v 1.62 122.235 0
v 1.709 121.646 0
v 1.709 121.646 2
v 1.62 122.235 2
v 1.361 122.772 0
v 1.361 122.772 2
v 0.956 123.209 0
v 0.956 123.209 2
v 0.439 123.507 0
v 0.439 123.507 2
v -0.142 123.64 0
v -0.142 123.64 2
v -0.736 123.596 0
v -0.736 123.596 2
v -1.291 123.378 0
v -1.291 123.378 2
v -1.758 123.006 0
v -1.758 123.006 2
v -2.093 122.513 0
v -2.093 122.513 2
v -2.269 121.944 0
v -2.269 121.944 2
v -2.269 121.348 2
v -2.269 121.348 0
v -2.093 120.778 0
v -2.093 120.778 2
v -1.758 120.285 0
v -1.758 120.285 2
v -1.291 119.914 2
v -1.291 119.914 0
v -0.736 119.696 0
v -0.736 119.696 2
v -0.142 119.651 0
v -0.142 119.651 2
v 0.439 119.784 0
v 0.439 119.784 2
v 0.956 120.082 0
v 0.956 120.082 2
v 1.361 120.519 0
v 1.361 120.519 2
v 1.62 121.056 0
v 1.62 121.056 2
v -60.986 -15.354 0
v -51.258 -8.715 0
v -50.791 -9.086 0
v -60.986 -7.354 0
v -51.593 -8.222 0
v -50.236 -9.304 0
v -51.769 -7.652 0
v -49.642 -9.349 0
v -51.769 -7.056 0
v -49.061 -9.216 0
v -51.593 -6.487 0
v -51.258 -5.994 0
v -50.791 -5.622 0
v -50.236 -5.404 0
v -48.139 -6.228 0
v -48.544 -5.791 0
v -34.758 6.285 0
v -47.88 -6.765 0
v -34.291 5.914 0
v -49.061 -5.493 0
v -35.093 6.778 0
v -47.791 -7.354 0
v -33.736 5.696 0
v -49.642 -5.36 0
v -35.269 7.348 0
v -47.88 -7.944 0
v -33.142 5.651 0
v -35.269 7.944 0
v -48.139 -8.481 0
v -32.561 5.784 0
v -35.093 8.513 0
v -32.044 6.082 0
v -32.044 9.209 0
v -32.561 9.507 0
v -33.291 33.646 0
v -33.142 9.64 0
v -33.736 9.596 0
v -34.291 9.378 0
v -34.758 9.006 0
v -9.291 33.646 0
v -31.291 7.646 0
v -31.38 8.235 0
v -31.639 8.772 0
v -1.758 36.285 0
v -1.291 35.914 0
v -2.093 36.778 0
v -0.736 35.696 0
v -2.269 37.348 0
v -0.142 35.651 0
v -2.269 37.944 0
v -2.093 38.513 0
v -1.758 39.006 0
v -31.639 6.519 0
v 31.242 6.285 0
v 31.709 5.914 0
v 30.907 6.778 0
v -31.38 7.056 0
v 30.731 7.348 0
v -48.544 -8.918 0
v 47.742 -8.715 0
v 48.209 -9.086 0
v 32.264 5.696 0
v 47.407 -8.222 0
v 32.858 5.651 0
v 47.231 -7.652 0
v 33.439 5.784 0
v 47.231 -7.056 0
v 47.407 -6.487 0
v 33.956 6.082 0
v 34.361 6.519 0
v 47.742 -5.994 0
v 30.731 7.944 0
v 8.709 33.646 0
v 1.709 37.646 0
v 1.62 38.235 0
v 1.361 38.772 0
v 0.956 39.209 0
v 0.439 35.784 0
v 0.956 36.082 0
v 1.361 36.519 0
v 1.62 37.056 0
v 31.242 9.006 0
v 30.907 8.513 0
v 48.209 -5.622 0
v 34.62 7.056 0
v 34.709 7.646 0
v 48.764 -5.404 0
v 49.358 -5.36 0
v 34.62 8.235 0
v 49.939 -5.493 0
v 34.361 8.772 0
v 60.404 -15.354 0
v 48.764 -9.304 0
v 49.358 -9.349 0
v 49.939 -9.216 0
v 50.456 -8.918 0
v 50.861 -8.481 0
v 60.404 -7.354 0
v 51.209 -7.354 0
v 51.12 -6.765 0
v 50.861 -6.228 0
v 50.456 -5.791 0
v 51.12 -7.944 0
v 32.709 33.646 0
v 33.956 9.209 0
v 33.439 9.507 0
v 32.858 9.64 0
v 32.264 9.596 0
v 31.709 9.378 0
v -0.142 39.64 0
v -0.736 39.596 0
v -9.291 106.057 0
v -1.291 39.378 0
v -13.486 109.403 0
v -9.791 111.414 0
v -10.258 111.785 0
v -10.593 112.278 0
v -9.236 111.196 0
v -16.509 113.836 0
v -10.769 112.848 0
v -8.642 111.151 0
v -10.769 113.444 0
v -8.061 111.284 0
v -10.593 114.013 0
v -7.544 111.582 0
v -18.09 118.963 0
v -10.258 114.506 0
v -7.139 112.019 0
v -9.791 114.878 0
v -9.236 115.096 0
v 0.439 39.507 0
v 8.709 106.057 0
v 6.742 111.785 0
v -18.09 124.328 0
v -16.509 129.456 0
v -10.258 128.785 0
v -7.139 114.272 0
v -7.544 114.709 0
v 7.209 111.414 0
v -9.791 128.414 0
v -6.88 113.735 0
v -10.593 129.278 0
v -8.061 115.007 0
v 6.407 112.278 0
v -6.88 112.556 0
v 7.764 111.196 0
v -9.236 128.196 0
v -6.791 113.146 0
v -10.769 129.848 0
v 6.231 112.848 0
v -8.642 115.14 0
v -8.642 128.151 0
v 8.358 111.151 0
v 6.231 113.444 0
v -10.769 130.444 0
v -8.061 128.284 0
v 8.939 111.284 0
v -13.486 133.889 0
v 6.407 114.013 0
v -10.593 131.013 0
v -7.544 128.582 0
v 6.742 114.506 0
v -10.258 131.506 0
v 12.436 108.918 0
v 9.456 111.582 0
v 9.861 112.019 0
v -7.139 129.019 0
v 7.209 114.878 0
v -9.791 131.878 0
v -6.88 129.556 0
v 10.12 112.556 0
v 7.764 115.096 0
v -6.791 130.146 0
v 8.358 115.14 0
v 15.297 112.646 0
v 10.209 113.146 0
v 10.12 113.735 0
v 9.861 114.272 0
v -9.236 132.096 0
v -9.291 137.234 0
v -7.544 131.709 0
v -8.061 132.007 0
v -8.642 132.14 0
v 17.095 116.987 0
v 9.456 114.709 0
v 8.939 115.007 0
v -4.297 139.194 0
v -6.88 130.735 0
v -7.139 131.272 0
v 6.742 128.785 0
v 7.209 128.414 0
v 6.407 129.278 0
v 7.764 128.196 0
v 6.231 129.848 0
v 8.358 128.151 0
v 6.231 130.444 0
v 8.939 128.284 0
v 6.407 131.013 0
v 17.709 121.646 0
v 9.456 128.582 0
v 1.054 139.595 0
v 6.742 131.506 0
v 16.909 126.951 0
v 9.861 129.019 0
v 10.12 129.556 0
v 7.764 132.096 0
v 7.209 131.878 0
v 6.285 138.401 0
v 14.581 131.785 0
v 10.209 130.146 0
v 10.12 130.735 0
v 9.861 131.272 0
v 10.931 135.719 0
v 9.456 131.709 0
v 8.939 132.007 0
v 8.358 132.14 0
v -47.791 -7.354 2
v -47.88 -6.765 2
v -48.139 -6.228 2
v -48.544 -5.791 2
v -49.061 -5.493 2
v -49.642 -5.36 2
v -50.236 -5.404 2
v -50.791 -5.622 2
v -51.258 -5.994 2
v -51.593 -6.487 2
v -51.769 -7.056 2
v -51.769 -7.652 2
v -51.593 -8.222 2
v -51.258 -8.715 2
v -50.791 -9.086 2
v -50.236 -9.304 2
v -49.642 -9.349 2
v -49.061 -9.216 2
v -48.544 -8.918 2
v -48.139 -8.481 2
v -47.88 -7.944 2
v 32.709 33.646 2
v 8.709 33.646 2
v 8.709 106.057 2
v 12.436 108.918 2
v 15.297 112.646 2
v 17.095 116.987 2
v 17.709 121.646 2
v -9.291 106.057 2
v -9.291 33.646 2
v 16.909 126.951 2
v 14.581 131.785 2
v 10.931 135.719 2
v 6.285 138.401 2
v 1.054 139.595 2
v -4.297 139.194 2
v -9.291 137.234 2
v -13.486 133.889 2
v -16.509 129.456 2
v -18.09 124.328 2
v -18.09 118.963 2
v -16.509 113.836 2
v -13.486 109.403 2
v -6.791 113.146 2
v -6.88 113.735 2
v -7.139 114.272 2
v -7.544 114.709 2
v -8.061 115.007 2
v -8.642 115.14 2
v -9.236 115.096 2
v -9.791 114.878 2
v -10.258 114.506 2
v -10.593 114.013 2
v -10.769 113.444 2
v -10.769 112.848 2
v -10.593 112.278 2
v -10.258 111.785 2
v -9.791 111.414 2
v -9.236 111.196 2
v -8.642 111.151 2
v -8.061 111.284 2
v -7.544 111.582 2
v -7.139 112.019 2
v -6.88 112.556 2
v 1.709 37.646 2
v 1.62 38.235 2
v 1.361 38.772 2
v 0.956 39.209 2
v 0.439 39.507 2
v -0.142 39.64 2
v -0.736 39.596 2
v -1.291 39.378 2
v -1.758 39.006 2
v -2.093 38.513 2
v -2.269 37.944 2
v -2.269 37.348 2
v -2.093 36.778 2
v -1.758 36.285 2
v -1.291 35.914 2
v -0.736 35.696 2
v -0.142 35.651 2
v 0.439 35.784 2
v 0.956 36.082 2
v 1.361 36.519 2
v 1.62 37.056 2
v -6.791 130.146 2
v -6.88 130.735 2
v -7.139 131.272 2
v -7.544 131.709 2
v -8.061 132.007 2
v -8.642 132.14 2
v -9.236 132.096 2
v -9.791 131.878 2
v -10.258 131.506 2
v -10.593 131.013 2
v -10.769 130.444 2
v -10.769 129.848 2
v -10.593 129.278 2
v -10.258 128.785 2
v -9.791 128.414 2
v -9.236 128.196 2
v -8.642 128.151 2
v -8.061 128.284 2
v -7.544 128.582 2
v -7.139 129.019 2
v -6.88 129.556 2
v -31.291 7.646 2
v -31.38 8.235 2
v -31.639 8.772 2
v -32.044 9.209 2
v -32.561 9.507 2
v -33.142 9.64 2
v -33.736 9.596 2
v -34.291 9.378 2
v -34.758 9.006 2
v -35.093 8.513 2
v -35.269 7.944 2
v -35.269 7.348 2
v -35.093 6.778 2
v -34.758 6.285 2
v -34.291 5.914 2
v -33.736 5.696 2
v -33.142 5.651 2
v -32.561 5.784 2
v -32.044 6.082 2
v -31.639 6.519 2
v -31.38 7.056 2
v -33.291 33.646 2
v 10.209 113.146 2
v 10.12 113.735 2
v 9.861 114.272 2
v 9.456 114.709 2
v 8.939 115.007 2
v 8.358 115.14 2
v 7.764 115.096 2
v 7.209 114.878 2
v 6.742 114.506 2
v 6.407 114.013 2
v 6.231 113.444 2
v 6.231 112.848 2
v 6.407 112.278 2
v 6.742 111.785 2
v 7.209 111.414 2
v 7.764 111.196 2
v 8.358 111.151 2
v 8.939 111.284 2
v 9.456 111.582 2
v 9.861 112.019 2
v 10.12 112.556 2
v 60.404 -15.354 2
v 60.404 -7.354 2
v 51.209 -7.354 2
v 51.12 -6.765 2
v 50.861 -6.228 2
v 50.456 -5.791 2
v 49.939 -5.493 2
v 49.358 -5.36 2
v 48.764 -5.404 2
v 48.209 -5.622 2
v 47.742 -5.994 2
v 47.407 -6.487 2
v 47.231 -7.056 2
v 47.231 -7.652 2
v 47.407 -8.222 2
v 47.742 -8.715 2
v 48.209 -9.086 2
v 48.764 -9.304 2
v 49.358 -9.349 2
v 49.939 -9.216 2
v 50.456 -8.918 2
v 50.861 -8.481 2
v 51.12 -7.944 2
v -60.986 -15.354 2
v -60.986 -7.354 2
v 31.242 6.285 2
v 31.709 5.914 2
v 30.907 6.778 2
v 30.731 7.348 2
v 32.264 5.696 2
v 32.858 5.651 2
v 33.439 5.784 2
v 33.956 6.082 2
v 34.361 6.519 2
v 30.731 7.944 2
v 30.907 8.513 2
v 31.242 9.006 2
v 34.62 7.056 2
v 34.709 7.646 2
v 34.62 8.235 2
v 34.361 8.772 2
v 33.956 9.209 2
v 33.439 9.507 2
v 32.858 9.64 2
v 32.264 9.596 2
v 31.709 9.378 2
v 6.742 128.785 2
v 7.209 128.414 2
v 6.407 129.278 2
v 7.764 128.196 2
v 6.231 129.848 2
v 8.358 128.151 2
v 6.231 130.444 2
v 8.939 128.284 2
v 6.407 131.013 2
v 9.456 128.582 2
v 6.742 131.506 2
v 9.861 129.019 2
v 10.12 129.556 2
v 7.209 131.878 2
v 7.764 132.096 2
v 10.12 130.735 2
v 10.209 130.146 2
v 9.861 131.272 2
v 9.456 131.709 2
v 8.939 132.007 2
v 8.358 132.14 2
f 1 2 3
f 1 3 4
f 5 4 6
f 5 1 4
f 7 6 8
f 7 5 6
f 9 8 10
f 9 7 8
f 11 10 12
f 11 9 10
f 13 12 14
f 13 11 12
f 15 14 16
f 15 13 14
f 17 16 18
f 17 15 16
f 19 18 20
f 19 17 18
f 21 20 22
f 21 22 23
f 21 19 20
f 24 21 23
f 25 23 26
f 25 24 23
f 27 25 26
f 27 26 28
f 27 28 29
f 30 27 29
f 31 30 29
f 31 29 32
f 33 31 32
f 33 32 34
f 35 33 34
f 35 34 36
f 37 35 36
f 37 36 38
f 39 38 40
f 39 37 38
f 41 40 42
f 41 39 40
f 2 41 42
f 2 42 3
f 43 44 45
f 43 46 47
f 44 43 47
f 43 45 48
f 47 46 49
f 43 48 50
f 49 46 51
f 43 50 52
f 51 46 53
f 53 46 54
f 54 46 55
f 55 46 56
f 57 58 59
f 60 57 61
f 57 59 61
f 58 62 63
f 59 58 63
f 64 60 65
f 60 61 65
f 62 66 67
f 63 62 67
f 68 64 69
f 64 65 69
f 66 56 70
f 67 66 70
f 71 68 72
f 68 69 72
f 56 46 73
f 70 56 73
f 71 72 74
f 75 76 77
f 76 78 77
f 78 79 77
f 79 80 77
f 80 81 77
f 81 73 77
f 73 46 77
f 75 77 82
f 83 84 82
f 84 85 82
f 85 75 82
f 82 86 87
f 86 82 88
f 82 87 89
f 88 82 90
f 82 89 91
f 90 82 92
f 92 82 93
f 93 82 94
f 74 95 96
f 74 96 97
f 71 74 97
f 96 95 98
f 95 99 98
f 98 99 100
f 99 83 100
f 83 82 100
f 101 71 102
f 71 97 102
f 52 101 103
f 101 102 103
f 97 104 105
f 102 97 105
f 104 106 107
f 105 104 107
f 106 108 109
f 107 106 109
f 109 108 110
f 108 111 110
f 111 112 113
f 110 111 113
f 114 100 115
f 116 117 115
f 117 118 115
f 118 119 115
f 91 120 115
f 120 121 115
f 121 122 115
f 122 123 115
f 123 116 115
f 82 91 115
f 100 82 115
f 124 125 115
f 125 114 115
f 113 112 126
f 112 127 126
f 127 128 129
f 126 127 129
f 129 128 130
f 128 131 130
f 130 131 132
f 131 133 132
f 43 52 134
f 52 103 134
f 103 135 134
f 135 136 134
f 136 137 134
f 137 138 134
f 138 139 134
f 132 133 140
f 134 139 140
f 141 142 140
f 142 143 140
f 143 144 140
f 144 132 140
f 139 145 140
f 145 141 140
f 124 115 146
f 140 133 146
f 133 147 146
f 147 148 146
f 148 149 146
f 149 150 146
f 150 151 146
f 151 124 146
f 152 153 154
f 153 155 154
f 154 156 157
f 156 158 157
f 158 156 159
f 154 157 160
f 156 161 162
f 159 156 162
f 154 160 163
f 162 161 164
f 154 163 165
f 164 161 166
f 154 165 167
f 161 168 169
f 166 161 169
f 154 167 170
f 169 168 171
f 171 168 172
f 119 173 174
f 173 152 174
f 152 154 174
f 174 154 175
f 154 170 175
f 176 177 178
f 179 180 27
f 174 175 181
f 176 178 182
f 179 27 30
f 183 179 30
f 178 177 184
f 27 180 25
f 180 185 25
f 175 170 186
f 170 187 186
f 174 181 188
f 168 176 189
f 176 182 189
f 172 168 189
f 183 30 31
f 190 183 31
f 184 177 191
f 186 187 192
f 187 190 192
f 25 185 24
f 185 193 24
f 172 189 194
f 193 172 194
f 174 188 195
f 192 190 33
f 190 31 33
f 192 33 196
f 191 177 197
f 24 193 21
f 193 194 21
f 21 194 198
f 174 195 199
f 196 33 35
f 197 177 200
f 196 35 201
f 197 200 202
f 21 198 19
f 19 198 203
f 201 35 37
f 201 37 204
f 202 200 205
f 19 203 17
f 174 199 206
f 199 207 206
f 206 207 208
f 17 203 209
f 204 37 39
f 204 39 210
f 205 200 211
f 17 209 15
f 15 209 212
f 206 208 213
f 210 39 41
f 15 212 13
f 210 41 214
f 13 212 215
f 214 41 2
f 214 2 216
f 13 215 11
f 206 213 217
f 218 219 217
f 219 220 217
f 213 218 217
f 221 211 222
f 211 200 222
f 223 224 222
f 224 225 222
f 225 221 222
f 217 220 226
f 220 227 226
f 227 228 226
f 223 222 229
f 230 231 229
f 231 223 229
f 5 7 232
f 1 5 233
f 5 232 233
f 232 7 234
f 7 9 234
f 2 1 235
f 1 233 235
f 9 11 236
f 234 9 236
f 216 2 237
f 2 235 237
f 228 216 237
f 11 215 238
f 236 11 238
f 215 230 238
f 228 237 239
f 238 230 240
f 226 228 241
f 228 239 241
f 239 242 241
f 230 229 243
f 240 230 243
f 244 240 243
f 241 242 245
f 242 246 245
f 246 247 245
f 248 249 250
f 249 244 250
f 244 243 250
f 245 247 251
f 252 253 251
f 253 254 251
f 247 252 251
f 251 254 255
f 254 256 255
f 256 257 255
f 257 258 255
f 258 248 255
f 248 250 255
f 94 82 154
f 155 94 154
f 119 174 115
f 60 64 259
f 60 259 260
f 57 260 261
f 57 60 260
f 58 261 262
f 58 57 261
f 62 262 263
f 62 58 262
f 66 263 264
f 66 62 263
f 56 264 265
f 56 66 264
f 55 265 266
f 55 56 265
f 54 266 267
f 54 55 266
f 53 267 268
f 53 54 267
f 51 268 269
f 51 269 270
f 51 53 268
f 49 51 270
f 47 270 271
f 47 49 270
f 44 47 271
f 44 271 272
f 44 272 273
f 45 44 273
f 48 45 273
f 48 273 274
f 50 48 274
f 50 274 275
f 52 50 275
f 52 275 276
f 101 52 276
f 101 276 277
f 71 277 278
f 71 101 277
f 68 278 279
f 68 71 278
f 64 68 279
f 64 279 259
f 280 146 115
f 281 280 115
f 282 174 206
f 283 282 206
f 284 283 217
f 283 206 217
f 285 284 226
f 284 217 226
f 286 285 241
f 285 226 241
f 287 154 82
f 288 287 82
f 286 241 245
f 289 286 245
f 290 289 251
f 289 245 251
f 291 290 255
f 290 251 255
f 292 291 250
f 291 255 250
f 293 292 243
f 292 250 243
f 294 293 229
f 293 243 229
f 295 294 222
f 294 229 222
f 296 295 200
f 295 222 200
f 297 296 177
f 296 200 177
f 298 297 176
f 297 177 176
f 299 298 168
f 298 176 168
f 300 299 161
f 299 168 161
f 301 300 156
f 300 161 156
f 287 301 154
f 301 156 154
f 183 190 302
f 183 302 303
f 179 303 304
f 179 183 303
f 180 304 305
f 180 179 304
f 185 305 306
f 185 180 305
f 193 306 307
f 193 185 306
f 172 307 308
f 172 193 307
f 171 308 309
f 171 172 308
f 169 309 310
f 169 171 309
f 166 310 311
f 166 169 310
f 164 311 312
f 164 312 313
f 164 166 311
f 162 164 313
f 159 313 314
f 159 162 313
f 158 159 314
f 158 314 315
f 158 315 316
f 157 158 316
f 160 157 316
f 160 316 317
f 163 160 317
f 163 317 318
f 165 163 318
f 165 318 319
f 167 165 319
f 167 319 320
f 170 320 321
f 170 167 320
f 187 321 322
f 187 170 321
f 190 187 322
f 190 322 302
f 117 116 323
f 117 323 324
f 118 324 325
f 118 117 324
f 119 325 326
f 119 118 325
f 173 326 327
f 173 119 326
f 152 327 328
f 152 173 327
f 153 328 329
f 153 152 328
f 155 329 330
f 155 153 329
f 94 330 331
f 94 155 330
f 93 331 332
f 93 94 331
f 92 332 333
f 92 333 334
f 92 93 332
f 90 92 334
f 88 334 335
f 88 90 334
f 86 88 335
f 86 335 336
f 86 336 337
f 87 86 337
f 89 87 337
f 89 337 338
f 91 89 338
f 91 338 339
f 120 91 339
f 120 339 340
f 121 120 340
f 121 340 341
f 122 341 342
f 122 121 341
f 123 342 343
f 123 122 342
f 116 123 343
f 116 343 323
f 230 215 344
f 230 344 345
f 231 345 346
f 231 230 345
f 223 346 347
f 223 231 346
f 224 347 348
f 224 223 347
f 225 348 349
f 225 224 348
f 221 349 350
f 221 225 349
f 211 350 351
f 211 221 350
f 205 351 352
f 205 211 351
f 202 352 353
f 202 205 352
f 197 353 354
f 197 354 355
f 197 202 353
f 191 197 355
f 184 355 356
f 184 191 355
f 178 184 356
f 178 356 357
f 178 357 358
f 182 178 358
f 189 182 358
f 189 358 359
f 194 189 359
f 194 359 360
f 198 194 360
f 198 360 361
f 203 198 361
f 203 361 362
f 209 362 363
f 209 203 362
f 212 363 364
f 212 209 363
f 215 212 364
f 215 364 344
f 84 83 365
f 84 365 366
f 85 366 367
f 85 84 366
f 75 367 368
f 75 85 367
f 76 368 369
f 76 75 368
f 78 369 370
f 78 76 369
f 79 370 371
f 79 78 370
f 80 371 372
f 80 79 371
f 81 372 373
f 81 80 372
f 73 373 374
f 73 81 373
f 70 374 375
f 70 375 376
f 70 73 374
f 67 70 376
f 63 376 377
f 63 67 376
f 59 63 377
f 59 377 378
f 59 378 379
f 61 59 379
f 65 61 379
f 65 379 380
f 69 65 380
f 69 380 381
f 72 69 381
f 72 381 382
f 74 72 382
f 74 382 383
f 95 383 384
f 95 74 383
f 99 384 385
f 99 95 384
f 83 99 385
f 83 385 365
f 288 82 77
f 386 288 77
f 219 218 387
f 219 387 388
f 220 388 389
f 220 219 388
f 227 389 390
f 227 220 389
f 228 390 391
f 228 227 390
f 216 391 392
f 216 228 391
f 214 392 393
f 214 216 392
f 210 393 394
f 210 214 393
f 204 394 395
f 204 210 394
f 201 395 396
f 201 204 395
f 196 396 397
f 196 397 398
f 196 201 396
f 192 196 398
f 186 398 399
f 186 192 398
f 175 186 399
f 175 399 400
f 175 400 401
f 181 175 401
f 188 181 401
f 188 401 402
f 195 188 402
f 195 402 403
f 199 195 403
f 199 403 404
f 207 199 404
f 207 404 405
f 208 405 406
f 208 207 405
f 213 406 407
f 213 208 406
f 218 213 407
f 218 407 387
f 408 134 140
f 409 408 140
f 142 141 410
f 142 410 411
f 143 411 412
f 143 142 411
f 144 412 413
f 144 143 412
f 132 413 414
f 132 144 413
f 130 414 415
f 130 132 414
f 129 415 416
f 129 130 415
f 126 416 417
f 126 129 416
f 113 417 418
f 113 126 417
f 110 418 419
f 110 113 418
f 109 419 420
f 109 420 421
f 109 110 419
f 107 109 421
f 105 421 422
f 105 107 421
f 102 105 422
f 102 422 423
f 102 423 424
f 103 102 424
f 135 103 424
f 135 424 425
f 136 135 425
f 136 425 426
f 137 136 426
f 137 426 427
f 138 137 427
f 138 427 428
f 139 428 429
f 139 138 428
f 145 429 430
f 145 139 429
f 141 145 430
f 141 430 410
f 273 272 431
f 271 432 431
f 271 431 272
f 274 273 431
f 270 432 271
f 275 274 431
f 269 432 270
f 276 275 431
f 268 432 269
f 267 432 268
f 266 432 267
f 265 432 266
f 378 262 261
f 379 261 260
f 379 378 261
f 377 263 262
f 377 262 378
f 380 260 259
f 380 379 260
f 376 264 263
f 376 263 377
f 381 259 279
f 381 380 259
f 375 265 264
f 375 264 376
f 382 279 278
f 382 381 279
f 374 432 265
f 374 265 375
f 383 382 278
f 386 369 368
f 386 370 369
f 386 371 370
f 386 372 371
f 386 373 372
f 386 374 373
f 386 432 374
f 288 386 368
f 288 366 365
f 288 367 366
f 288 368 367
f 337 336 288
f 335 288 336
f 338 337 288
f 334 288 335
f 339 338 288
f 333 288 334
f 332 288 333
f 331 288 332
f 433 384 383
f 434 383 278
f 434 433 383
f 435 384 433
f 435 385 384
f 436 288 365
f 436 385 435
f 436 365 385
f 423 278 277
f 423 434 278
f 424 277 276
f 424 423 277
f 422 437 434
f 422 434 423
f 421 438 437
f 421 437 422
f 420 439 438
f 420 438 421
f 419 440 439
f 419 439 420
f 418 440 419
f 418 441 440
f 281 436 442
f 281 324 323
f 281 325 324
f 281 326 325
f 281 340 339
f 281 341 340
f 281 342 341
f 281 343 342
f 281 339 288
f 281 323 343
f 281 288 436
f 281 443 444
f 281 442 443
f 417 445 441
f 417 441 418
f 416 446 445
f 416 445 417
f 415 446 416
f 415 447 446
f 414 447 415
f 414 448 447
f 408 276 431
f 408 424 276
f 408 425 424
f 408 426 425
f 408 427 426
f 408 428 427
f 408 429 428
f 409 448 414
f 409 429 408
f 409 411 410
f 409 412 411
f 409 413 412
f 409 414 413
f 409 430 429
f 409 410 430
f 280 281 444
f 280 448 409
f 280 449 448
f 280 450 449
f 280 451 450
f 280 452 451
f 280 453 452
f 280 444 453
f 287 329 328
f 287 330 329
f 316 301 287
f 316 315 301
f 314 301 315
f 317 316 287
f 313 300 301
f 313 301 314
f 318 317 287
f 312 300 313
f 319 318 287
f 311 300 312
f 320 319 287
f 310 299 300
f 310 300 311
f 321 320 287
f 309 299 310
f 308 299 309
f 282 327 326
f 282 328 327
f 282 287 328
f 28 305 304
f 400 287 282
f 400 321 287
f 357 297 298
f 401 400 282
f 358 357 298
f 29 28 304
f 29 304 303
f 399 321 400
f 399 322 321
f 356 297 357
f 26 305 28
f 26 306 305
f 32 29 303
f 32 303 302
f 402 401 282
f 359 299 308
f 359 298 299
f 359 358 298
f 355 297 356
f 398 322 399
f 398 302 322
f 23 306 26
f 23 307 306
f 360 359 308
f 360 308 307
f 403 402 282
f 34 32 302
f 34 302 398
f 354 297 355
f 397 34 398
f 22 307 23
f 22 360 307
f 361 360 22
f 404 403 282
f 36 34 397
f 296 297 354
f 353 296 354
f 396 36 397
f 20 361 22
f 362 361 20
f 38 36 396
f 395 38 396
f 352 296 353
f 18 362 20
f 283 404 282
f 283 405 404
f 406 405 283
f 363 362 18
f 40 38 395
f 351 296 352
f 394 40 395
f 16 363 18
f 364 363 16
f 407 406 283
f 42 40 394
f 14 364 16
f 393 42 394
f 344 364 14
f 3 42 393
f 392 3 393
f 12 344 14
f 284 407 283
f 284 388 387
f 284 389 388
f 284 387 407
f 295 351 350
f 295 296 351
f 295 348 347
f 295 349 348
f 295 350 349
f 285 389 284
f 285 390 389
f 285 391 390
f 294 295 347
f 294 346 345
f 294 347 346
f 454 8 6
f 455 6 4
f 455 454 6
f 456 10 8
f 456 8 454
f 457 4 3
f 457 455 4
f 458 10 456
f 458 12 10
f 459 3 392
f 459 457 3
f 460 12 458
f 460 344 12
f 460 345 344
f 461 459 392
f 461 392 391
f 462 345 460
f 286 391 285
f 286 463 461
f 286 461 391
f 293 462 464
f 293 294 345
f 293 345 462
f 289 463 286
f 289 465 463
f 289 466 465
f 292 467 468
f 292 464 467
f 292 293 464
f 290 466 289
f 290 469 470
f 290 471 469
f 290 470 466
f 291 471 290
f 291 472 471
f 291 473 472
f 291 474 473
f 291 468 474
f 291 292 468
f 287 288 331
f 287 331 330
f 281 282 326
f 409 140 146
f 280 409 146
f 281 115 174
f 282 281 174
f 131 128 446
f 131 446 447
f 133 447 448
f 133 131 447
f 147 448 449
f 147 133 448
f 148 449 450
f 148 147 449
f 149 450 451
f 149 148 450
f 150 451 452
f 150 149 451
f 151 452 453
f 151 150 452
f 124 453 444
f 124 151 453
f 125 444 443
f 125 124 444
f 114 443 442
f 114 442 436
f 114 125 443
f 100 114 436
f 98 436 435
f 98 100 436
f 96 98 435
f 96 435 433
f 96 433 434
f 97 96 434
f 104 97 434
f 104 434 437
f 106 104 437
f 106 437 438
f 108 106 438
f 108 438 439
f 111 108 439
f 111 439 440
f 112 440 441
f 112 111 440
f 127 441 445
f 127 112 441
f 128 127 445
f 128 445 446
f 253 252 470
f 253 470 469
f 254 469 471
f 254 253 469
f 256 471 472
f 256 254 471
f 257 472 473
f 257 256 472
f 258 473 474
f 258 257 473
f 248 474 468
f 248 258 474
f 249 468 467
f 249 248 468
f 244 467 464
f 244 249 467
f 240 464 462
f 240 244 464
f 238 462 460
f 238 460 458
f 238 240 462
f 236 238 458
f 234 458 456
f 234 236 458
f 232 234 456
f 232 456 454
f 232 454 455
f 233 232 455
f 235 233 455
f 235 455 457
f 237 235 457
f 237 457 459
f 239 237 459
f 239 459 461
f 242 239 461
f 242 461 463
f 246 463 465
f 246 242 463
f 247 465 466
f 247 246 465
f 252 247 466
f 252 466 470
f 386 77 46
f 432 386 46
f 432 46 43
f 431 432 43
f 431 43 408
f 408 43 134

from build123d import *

# Parameters (mm, degrees)
SKETCH_1_R      = 2
EXTRUDE_1_DEPTH = 2


with BuildPart() as part:
    # 草图1 → 凸台-拉伸1 (new body)
    # profile 1 of 8: a face of its own
    with BuildSketch(Plane.XY):
        with BuildLine():
            Line((-9.291428571, 106.057257018), (-9.291428571, 33.645714286))
            Line((-9.291428571, 33.645714286), (-33.291428571, 33.645714286))
            Line((-33.291428571, 33.645714286), (-60.986481548, -7.354285714))
            Line((-60.986481548, -7.354285714), (-60.986481548, -15.354285714))
            Line((-60.986481548, -15.354285714), (-0.582857143, -15.354285714))
            Line((-0.582857143, -15.354285714), (0, -15.354285714))
            Line((0, -15.354285714), (60.403624405, -15.354285714))
            Line((60.403624405, -15.354285714), (60.403624405, -7.354285714))
            Line((60.403624405, -7.354285714), (32.708571429, 33.645714286))
            Line((32.708571429, 33.645714286), (8.708571429, 33.645714286))
            Line((8.708571429, 33.645714286), (8.708571429, 106.057257018))
            ThreePointArc((8.708571429, 106.057257018), (-0.291428571, 103.645714286), (-9.291428571, 106.057257018))
        make_face()
        with Locations((-49.791428571, -7.354285714)):
            Circle(SKETCH_1_R, mode=Mode.SUBTRACT)
        with Locations((-33.291428571, 7.645714286)):
            Circle(SKETCH_1_R, mode=Mode.SUBTRACT)
        with Locations((-16.791428571, -7.354285714)):
            Circle(SKETCH_1_R, mode=Mode.SUBTRACT)
        with Locations((-0.291428571, 7.645714286)):
            Circle(SKETCH_1_R, mode=Mode.SUBTRACT)
        with BuildLine():
            add(Edge.make_bspline(
                [(-13.112946754, 19.24107863), (-13.117507431, 19.192525358), (-13.126009121, 19.102015814), (-13.163633477, 18.976976473), (-13.224294442, 18.873128684), (-13.310152608, 18.796036169), (-13.405968226, 18.73894597), (-13.507221815, 18.696340834), (-13.614166311, 18.670943234), (-13.687426318, 18.668450292), (-13.724573402, 18.667186225)],
                knots=[0, 0, 0, 0, 1.240550697, 2.312546057, 3.302349966, 4.263860416, 5.218032513, 6.135468179, 7.054573937, 8, 8, 8, 8], degree=3))
            Line((-13.112946754, 19.24107863), (-13.11482685, 26.812195725))
            add(Edge.make_bspline(
                [(-13.789369633, 27.474632748), (-13.738803864, 27.471517031), (-13.642654112, 27.465592559), (-13.506191943, 27.437213361), (-13.389904602, 27.383659695), (-13.29104534, 27.311053803), (-13.217784011, 27.212861918), (-13.159811251, 27.09812106), (-13.124337859, 26.961571237), (-13.118115484, 26.863845486), (-13.11482685, 26.812195725)],
                knots=[0, 0, 0, 0, 1.133480904, 2.155290252, 3.097618657, 3.979323727, 4.869594101, 5.811399427, 6.843286507, 8, 8, 8, 8], degree=3))
            Line((-13.789369633, 27.474632748), (-14.40075185, 27.474632748))
            Line((-14.40075185, 27.474632748), (-14.40075185, 27.820910405))
            Line((-14.40075185, 27.820910405), (-10.408606041, 27.819030309))
            add(Edge.make_bspline(
                [(-6.505475334, 25.491078195), (-6.511083553, 25.602982802), (-6.521868874, 25.818189643), (-6.578610538, 26.127030514), (-6.668917007, 26.406444081), (-6.789027977, 26.66029892), (-6.947901882, 26.881604625), (-7.136344835, 27.07724673), (-7.359552705, 27.2419029), (-7.614270146, 27.375992441), (-7.893693166, 27.487106242), (-8.19396601, 27.582695288), (-8.513763866, 27.663670597), (-8.853977795, 27.72677366), (-9.213774122, 27.775986746), (-9.594447471, 27.807289222), (-9.995086667, 27.822188477), (-10.268706481, 27.820098763), (-10.408606041, 27.819030309)],
                knots=[0, 0, 0, 0, 1.039956407, 1.999968905, 2.906576639, 3.761369915, 4.597245318, 5.425510473, 6.27508438, 7.161467835, 8.092027264, 9.06500281, 10.086778256, 11.154172993, 12.277381244, 13.458582467, 14.700594122, 16, 16, 16, 16], degree=3))
            add(Edge.make_bspline(
                [(-7.410685493, 23.599734723), (-7.337701139, 23.66023899), (-7.194252283, 23.779158558), (-7.007785968, 23.981932383), (-6.849592603, 24.198320221), (-6.720772992, 24.428804957), (-6.622143236, 24.674348151), (-6.55291019, 24.934021594), (-6.509921831, 25.207967941), (-6.506975444, 25.395565592), (-6.505475334, 25.491078195)],
                knots=[0, 0, 0, 0, 1.043790947, 2.051544049, 3.026393326, 3.991957292, 4.953478889, 5.934510146, 6.948386013, 8, 8, 8, 8], degree=3))
            add(Edge.make_bspline(
                [(-9.79483465, 22.920112189), (-9.668072083, 22.930874387), (-9.42133434, 22.95182253), (-9.063387198, 23.002941381), (-8.729069898, 23.067878882), (-8.419068097, 23.147758169), (-8.13153105, 23.236737689), (-7.867617151, 23.341850523), (-7.627526667, 23.46143573), (-7.481477348, 23.554584431), (-7.410685493, 23.599734723)],
                knots=[0, 0, 0, 0, 1.218224179, 2.371219609, 3.461127923, 4.47824446, 5.435918827, 6.34183842, 7.196269206, 8, 8, 8, 8], degree=3))
            Line((-9.79483465, 22.920112189), (-7.530338991, 19.201039754))
            Line((-7.530338991, 19.201039754), (-7.184853437, 18.813977062))
            add(Edge.make_bspline(
                [(-6.722360853, 18.667188063), (-6.768845187, 18.668665711), (-6.857277038, 18.671476791), (-6.981761265, 18.701583574), (-7.093732838, 18.744203903), (-7.155001921, 18.791119063), (-7.184853437, 18.813977062)],
                knots=[0, 0, 0, 0, 1.124128933, 2.138544239, 3.093061746, 4, 4, 4, 4], degree=3))
            Line((-6.722360853, 18.667188063), (-6.113351269, 18.667188063))
            Line((-6.113351269, 18.667188063), (-6.113351269, 18.320910405))
            Line((-6.113351269, 18.320910405), (-7.810070808, 18.320910405))
            Line((-7.810070808, 18.320910405), (-10.527465599, 22.897771577))
            Line((-10.527465599, 22.897771577), (-12.52578157, 22.897771577))
            Line((-12.52578157, 22.897771577), (-12.52578157, 19.239294101))
            add(Edge.make_bspline(
                [(-11.792919055, 18.667188063), (-11.823350778, 18.666209041), (-11.888091701, 18.664126256), (-11.991662462, 18.682264711), (-12.107597956, 18.710327015), (-12.231876724, 18.750220148), (-12.354616091, 18.81411357), (-12.446003333, 18.926100007), (-12.507736237, 19.070653451), (-12.519462841, 19.180243125), (-12.52578157, 19.239294101)],
                knots=[0, 0, 0, 0, 0.693802496, 1.476006268, 2.390026098, 3.418615026, 4.45832201, 5.494963609, 6.650193591, 8, 8, 8, 8], degree=3))
            Line((-11.792919055, 18.667188063), (-11.193493734, 18.667188063))
            Line((-11.193493734, 18.667188063), (-11.193493734, 18.320910405))
            Line((-11.193493734, 18.320910405), (-14.40075185, 18.320910405))
            Line((-14.40075185, 18.320910405), (-14.40075185, 18.667188063))
            Line((-14.40075185, 18.667188063), (-13.724573402, 18.667186225))
        make_face(mode=Mode.SUBTRACT)
        with BuildLine():
            add(Edge.make_bspline(
                [(-3.959220736, 19.256284802), (-3.963076567, 19.209692223), (-3.970336414, 19.121966646), (-3.99829712, 18.999267855), (-4.040647434, 18.894845847), (-4.098141365, 18.809276619), (-4.169771264, 18.742396089), (-4.256941445, 18.697064656), (-4.357818409, 18.669880708), (-4.429516429, 18.668116788), (-4.467341025, 18.667186225)],
                knots=[0, 0, 0, 0, 1.271999278, 2.394949411, 3.413369715, 4.323118431, 5.181536852, 6.052778271, 6.972734865, 8, 8, 8, 8], degree=3))
            Line((-3.959220736, 19.256284802), (-3.961100832, 26.802786056))
            add(Edge.make_bspline(
                [(-4.49255416, 27.474632748), (-4.446878408, 27.471341575), (-4.360538549, 27.465120344), (-4.242120001, 27.430079243), (-4.143492644, 27.372060649), (-4.071985769, 27.287646224), (-4.01839387, 27.187251308), (-3.984206611, 27.071268722), (-3.962962101, 26.941589771), (-3.961741398, 26.850556129), (-3.961100832, 26.802786056)],
                knots=[0, 0, 0, 0, 1.119687802, 2.116520953, 2.999727408, 3.881862985, 4.789741442, 5.771887262, 6.83079368, 8, 8, 8, 8], degree=3))
            Line((-4.49255416, 27.474632748), (-5.299058361, 27.474632748))
            Line((-5.299058361, 27.474632748), (-5.299058361, 27.820910405))
            Line((-5.299058361, 27.820910405), (1.990187687, 27.820910405))
            Line((1.990187687, 27.820910405), (2.848724418, 25.406391174))
            Line((2.848724418, 25.406391174), (2.508987583, 25.406391174))
            add(Edge.make_bspline(
                [(0.064984109, 27.474632748), (0.140110651, 27.471154863), (0.286599267, 27.464373363), (0.500830616, 27.439126216), (0.702527408, 27.393967385), (0.891694128, 27.330950047), (1.070745414, 27.254665316), (1.23590935, 27.157074165), (1.392580141, 27.046877732), (1.582747366, 26.867141618), (1.806936582, 26.608752109), (2.060359664, 26.256497042), (2.297244462, 25.851767948), (2.436570812, 25.558711343), (2.508987583, 25.406391174)],
                knots=[0, 0, 0, 0, 0.792307697, 1.544914175, 2.26972427, 2.965754149, 3.643594828, 4.315869793, 4.983580278, 5.657186129, 7.066788734, 8.582010903, 10.223453531, 12, 12, 12, 12], degree=3))
            Line((0.064984109, 27.474632748), (-2.767954801, 27.47275449))
            add(Edge.make_bspline(
                [(-3.372055552, 26.802786056), (-3.37108094, 26.850608214), (-3.369217249, 26.942055671), (-3.342096259, 27.072362656), (-3.297906448, 27.188687071), (-3.232299276, 27.288403285), (-3.149042801, 27.373383156), (-3.038566834, 27.428931727), (-2.910189042, 27.46579959), (-2.81718321, 27.470347343), (-2.767954801, 27.47275449)],
                knots=[0, 0, 0, 0, 1.11464707, 2.13147302, 3.091549386, 4.001497762, 4.902562602, 5.833024687, 6.853010125, 8, 8, 8, 8], degree=3))
            Line((-3.372055552, 26.802786056), (-3.372055552, 23.364492998))
            Line((-3.372055552, 23.364492998), (-1.158901399, 23.364492998))
            add(Edge.make_bspline(
                [(0.025959712, 24.971664465), (0.026668858, 24.899524355), (0.028025744, 24.761490713), (0.022748432, 24.562439731), (0.009651859, 24.380359725), (-0.009516704, 24.214058374), (-0.041117367, 24.065006367), (-0.074252363, 23.931013194), (-0.120764958, 23.814878283), (-0.172638912, 23.712913215), (-0.238654631, 23.624880234), (-0.320805081, 23.550491773), (-0.420980084, 23.490269981), (-0.537050295, 23.441468987), (-0.669284856, 23.404568969), (-0.817999538, 23.378559018), (-0.982934878, 23.363301487), (-1.09864708, 23.364085001), (-1.158901399, 23.364492998)],
                knots=[0, 0, 0, 0, 1.45592283, 2.785778005, 4.017003254, 5.139764002, 6.16022002, 7.090717386, 7.920607392, 8.679475788, 9.393511104, 10.128452667, 10.901446109, 11.740937198, 12.662607922, 13.665877584, 14.784562444, 16, 16, 16, 16], degree=3))
            Line((0.025959712, 24.971664465), (0.351163019, 24.971664465))
            Line((0.351163019, 24.971664465), (0.351163019, 21.385066202))
            Line((0.351163019, 21.385066202), (0.024834963, 21.384698637))
            add(Edge.make_bspline(
                [(-1.158107458, 23.01821534), (-1.101278197, 23.01890193), (-0.992279831, 23.020218808), (-0.835238345, 23.011200881), (-0.692666196, 22.991485661), (-0.564583061, 22.959254425), (-0.450840709, 22.916771422), (-0.352345277, 22.86164618), (-0.266705005, 22.797458286), (-0.197457026, 22.717358039), (-0.139821155, 22.621684513), (-0.091227253, 22.506932492), (-0.050617673, 22.371886605), (-0.019210677, 22.214927487), (0.004897952, 22.037702121), (0.018947471, 21.838459716), (0.026538914, 21.618746458), (0.02541959, 21.465000599), (0.024834963, 21.384698637)],
                knots=[0, 0, 0, 0, 1.130688028, 2.168656484, 3.127251201, 3.990115579, 4.792240314, 5.535477769, 6.229605204, 6.910702075, 7.627905293, 8.444183714, 9.383981437, 10.429354697, 11.626292868, 12.94080821, 14.402174172, 16, 16, 16, 16], degree=3))
            Line((-1.158107458, 23.01821534), (-3.372055552, 23.01821534))
            Line((-3.372055552, 23.01821534), (-3.372055552, 19.256231506))
            add(Edge.make_bspline(
                [(-2.779764671, 18.667188063), (-2.814289076, 18.66756876), (-2.882577969, 18.668321775), (-2.98272001, 18.696189217), (-3.081471838, 18.734568784), (-3.175556844, 18.793056931), (-3.261537146, 18.871583309), (-3.321123574, 18.979981863), (-3.362041558, 19.10977492), (-3.368556036, 19.205050418), (-3.372055552, 19.256231506)],
                knots=[0, 0, 0, 0, 0.877803887, 1.736286428, 2.634488349, 3.576734679, 4.550971448, 5.570120121, 6.694691728, 8, 8, 8, 8], degree=3))
            Line((-2.779764671, 18.667188063), (-2.007546951, 18.667188063))
            Line((-2.007546951, 18.667188063), (-2.007546951, 18.320910405))
            Line((-2.007546951, 18.320910405), (-5.299058361, 18.320910405))
            Line((-5.299058361, 18.320910405), (-5.299058361, 18.667188063))
            Line((-5.299058361, 18.667188063), (-4.467341025, 18.667186225))
        make_face(mode=Mode.SUBTRACT)
        with Locations((-0.291428571, 37.645714286)):
            Circle(SKETCH_1_R, mode=Mode.SUBTRACT)
        with Locations((16.208571429, -7.354285714)):
            Circle(SKETCH_1_R, mode=Mode.SUBTRACT)
        with Locations((49.208571429, -7.354285714)):
            Circle(SKETCH_1_R, mode=Mode.SUBTRACT)
        with Locations((32.708571429, 7.645714286)):
            Circle(SKETCH_1_R, mode=Mode.SUBTRACT)
    # profile 2 of 8: a face of its own
    with BuildSketch(Plane.XY):
        with BuildLine():
            ThreePointArc((17.708571429, 121.645714286), (-9.291428571, 137.234171554), (-9.291428571, 106.057257018))
            ThreePointArc((-9.291428571, 106.057257018), (-0.291428571, 103.645714286), (8.708571429, 106.057257018))
            ThreePointArc((8.708571429, 106.057257018), (15.297028697, 112.645714286), (17.708571429, 121.645714286))
        make_face()
        with Locations((-8.791428571, 113.145714286)):
            Circle(SKETCH_1_R, mode=Mode.SUBTRACT)
        with Locations((-0.291428571, 121.645714286)):
            Circle(SKETCH_1_R, mode=Mode.SUBTRACT)
        with Locations((-8.791428571, 130.145714286)):
            Circle(SKETCH_1_R, mode=Mode.SUBTRACT)
        with Locations((8.208571429, 113.145714286)):
            Circle(SKETCH_1_R, mode=Mode.SUBTRACT)
        with Locations((8.208571429, 130.145714286)):
            Circle(SKETCH_1_R, mode=Mode.SUBTRACT)
    # profile 3 of 8: a face of its own
    with BuildSketch(Plane.XY):
        with Locations((16.208571429, -7.354285714)):
            Circle(SKETCH_1_R)
    # profile 4 of 8: a face of its own
    with BuildSketch(Plane.XY):
        with Locations((-16.791428571, -7.354285714)):
            Circle(SKETCH_1_R)
    # profile 5 of 8: a face of its own
    with BuildSketch(Plane.XY):
        with Locations((-0.291428571, 7.645714286)):
            Circle(SKETCH_1_R)
    # profile 6 of 8: a face of its own
    with BuildSketch(Plane.XY):
        with BuildLine():
            Line((-13.11482685, 26.812195725), (-13.112946754, 19.24107863))
            add(Edge.make_bspline(
                [(-13.112946754, 19.24107863), (-13.117507431, 19.192525358), (-13.126009121, 19.102015814), (-13.163633477, 18.976976473), (-13.224294442, 18.873128684), (-13.310152608, 18.796036169), (-13.405968226, 18.73894597), (-13.507221815, 18.696340834), (-13.614166311, 18.670943234), (-13.687426318, 18.668450292), (-13.724573402, 18.667186225)],
                knots=[0, 0, 0, 0, 1.240550697, 2.312546057, 3.302349966, 4.263860416, 5.218032513, 6.135468179, 7.054573937, 8, 8, 8, 8], degree=3))
            Line((-13.724573402, 18.667186225), (-14.40075185, 18.667188063))
            Line((-14.40075185, 18.667188063), (-14.40075185, 18.320910405))
            Line((-14.40075185, 18.320910405), (-11.193493734, 18.320910405))
            Line((-11.193493734, 18.320910405), (-11.193493734, 18.667188063))
            Line((-11.193493734, 18.667188063), (-11.792919055, 18.667188063))
            add(Edge.make_bspline(
                [(-11.792919055, 18.667188063), (-11.823350778, 18.666209041), (-11.888091701, 18.664126256), (-11.991662462, 18.682264711), (-12.107597956, 18.710327015), (-12.231876724, 18.750220148), (-12.354616091, 18.81411357), (-12.446003333, 18.926100007), (-12.507736237, 19.070653451), (-12.519462841, 19.180243125), (-12.52578157, 19.239294101)],
                knots=[0, 0, 0, 0, 0.693802496, 1.476006268, 2.390026098, 3.418615026, 4.45832201, 5.494963609, 6.650193591, 8, 8, 8, 8], degree=3))
            Line((-12.52578157, 19.239294101), (-12.52578157, 22.897771577))
            Line((-12.52578157, 22.897771577), (-10.527465599, 22.897771577))
            Line((-10.527465599, 22.897771577), (-7.810070808, 18.320910405))
            Line((-7.810070808, 18.320910405), (-6.113351269, 18.320910405))
            Line((-6.113351269, 18.320910405), (-6.113351269, 18.667188063))
            Line((-6.113351269, 18.667188063), (-6.722360853, 18.667188063))
            add(Edge.make_bspline(
                [(-6.722360853, 18.667188063), (-6.768845187, 18.668665711), (-6.857277038, 18.671476791), (-6.981761265, 18.701583574), (-7.093732838, 18.744203903), (-7.155001921, 18.791119063), (-7.184853437, 18.813977062)],
                knots=[0, 0, 0, 0, 1.124128933, 2.138544239, 3.093061746, 4, 4, 4, 4], degree=3))
            Line((-7.184853437, 18.813977062), (-7.530338991, 19.201039754))
            Line((-7.530338991, 19.201039754), (-9.79483465, 22.920112189))
            add(Edge.make_bspline(
                [(-9.79483465, 22.920112189), (-9.668072083, 22.930874387), (-9.42133434, 22.95182253), (-9.063387198, 23.002941381), (-8.729069898, 23.067878882), (-8.419068097, 23.147758169), (-8.13153105, 23.236737689), (-7.867617151, 23.341850523), (-7.627526667, 23.46143573), (-7.481477348, 23.554584431), (-7.410685493, 23.599734723)],
                knots=[0, 0, 0, 0, 1.218224179, 2.371219609, 3.461127923, 4.47824446, 5.435918827, 6.34183842, 7.196269206, 8, 8, 8, 8], degree=3))
            add(Edge.make_bspline(
                [(-7.410685493, 23.599734723), (-7.337701139, 23.66023899), (-7.194252283, 23.779158558), (-7.007785968, 23.981932383), (-6.849592603, 24.198320221), (-6.720772992, 24.428804957), (-6.622143236, 24.674348151), (-6.55291019, 24.934021594), (-6.509921831, 25.207967941), (-6.506975444, 25.395565592), (-6.505475334, 25.491078195)],
                knots=[0, 0, 0, 0, 1.043790947, 2.051544049, 3.026393326, 3.991957292, 4.953478889, 5.934510146, 6.948386013, 8, 8, 8, 8], degree=3))
            add(Edge.make_bspline(
                [(-6.505475334, 25.491078195), (-6.511083553, 25.602982802), (-6.521868874, 25.818189643), (-6.578610538, 26.127030514), (-6.668917007, 26.406444081), (-6.789027977, 26.66029892), (-6.947901882, 26.881604625), (-7.136344835, 27.07724673), (-7.359552705, 27.2419029), (-7.614270146, 27.375992441), (-7.893693166, 27.487106242), (-8.19396601, 27.582695288), (-8.513763866, 27.663670597), (-8.853977795, 27.72677366), (-9.213774122, 27.775986746), (-9.594447471, 27.807289222), (-9.995086667, 27.822188477), (-10.268706481, 27.820098763), (-10.408606041, 27.819030309)],
                knots=[0, 0, 0, 0, 1.039956407, 1.999968905, 2.906576639, 3.761369915, 4.597245318, 5.425510473, 6.27508438, 7.161467835, 8.092027264, 9.06500281, 10.086778256, 11.154172993, 12.277381244, 13.458582467, 14.700594122, 16, 16, 16, 16], degree=3))
            Line((-10.408606041, 27.819030309), (-14.40075185, 27.820910405))
            Line((-14.40075185, 27.820910405), (-14.40075185, 27.474632748))
            Line((-14.40075185, 27.474632748), (-13.789369633, 27.474632748))
            add(Edge.make_bspline(
                [(-13.789369633, 27.474632748), (-13.738803864, 27.471517031), (-13.642654112, 27.465592559), (-13.506191943, 27.437213361), (-13.389904602, 27.383659695), (-13.29104534, 27.311053803), (-13.217784011, 27.212861918), (-13.159811251, 27.09812106), (-13.124337859, 26.961571237), (-13.118115484, 26.863845486), (-13.11482685, 26.812195725)],
                knots=[0, 0, 0, 0, 1.133480904, 2.155290252, 3.097618657, 3.979323727, 4.869594101, 5.811399427, 6.843286507, 8, 8, 8, 8], degree=3))
        make_face()
        with BuildLine():
            Line((-10.807576008, 23.244049234), (-12.52578157, 23.244049234))
            Line((-12.52578157, 23.244049234), (-12.52578157, 26.81380566))
            add(Edge.make_bspline(
                [(-12.52578157, 26.81380566), (-12.525043153, 26.87185982), (-12.523660397, 26.980571842), (-12.486160478, 27.130049683), (-12.422164744, 27.254022682), (-12.319922194, 27.346461653), (-12.18239718, 27.407331144), (-12.009248925, 27.449095206), (-11.795561135, 27.471876784), (-11.639442554, 27.472445694), (-11.554703727, 27.47275449)],
                knots=[0, 0, 0, 0, 1.011827027, 1.894743824, 2.670067914, 3.415024863, 4.253666092, 5.272207079, 6.519394866, 8, 8, 8, 8], degree=3))
            Line((-11.554703727, 27.47275449), (-10.407580534, 27.474632748))
            add(Edge.make_bspline(
                [(-10.407580534, 27.474632748), (-10.264856282, 27.472697365), (-9.990140162, 27.468972134), (-9.594261942, 27.44434579), (-9.231071051, 27.405982046), (-8.900497293, 27.351655616), (-8.602196632, 27.283938202), (-8.337902819, 27.197163616), (-8.104793516, 27.097629549), (-7.968727226, 27.012710893), (-7.903752149, 26.972160098)],
                knots=[0, 0, 0, 0, 1.324242649, 2.548906689, 3.678911204, 4.711406018, 5.655939331, 6.513682023, 7.290245768, 8, 8, 8, 8], degree=3))
            add(Edge.make_bspline(
                [(-7.903752149, 26.972160098), (-7.839970591, 26.923870488), (-7.71566377, 26.829756639), (-7.550627797, 26.670265507), (-7.410038732, 26.500057727), (-7.294356909, 26.318929844), (-7.204804356, 26.126407252), (-7.141257659, 25.923937983), (-7.09966624, 25.71106681), (-7.095009653, 25.565298425), (-7.09263868, 25.491078195)],
                knots=[0, 0, 0, 0, 1.091024549, 2.126348061, 3.123850701, 4.097595001, 5.051299937, 6.012468514, 6.988017578, 8, 8, 8, 8], degree=3))
            add(Edge.make_bspline(
                [(-7.09263868, 25.491078195), (-7.095404669, 25.403061154), (-7.100817029, 25.230833451), (-7.146958925, 24.98010294), (-7.223438681, 24.744763616), (-7.325881756, 24.521988058), (-7.464994674, 24.317939102), (-7.628787357, 24.125459337), (-7.827123173, 23.952057994), (-7.974794267, 23.851038317), (-8.050542986, 23.799219706)],
                knots=[0, 0, 0, 0, 1.036652538, 2.028474077, 2.991670732, 3.947405712, 4.906964218, 5.892428746, 6.918909468, 8, 8, 8, 8], degree=3))
            add(Edge.make_bspline(
                [(-8.050542986, 23.799219706), (-8.126788177, 23.754156569), (-8.285378715, 23.660424924), (-8.551753816, 23.550024359), (-8.848457421, 23.453105241), (-9.178451887, 23.378816669), (-9.539332335, 23.31552662), (-9.933511227, 23.27356511), (-10.360010026, 23.250042466), (-10.655108741, 23.246090881), (-10.807576008, 23.244049234)],
                knots=[0, 0, 0, 0, 0.745866748, 1.551408113, 2.424433971, 3.375006914, 4.400102709, 5.512100979, 6.714588907, 8, 8, 8, 8], degree=3))
        make_face(mode=Mode.SUBTRACT)
    # profile 7 of 8: a face of its own
    with BuildSketch(Plane.XY):
        with BuildLine():
            Line((-12.52578157, 26.81380566), (-12.52578157, 23.244049234))
            Line((-12.52578157, 23.244049234), (-10.807576008, 23.244049234))
            add(Edge.make_bspline(
                [(-8.050542986, 23.799219706), (-8.126788177, 23.754156569), (-8.285378715, 23.660424924), (-8.551753816, 23.550024359), (-8.848457421, 23.453105241), (-9.178451887, 23.378816669), (-9.539332335, 23.31552662), (-9.933511227, 23.27356511), (-10.360010026, 23.250042466), (-10.655108741, 23.246090881), (-10.807576008, 23.244049234)],
                knots=[0, 0, 0, 0, 0.745866748, 1.551408113, 2.424433971, 3.375006914, 4.400102709, 5.512100979, 6.714588907, 8, 8, 8, 8], degree=3))
            add(Edge.make_bspline(
                [(-7.09263868, 25.491078195), (-7.095404669, 25.403061154), (-7.100817029, 25.230833451), (-7.146958925, 24.98010294), (-7.223438681, 24.744763616), (-7.325881756, 24.521988058), (-7.464994674, 24.317939102), (-7.628787357, 24.125459337), (-7.827123173, 23.952057994), (-7.974794267, 23.851038317), (-8.050542986, 23.799219706)],
                knots=[0, 0, 0, 0, 1.036652538, 2.028474077, 2.991670732, 3.947405712, 4.906964218, 5.892428746, 6.918909468, 8, 8, 8, 8], degree=3))
            add(Edge.make_bspline(
                [(-7.903752149, 26.972160098), (-7.839970591, 26.923870488), (-7.71566377, 26.829756639), (-7.550627797, 26.670265507), (-7.410038732, 26.500057727), (-7.294356909, 26.318929844), (-7.204804356, 26.126407252), (-7.141257659, 25.923937983), (-7.09966624, 25.71106681), (-7.095009653, 25.565298425), (-7.09263868, 25.491078195)],
                knots=[0, 0, 0, 0, 1.091024549, 2.126348061, 3.123850701, 4.097595001, 5.051299937, 6.012468514, 6.988017578, 8, 8, 8, 8], degree=3))
            add(Edge.make_bspline(
                [(-10.407580534, 27.474632748), (-10.264856282, 27.472697365), (-9.990140162, 27.468972134), (-9.594261942, 27.44434579), (-9.231071051, 27.405982046), (-8.900497293, 27.351655616), (-8.602196632, 27.283938202), (-8.337902819, 27.197163616), (-8.104793516, 27.097629549), (-7.968727226, 27.012710893), (-7.903752149, 26.972160098)],
                knots=[0, 0, 0, 0, 1.324242649, 2.548906689, 3.678911204, 4.711406018, 5.655939331, 6.513682023, 7.290245768, 8, 8, 8, 8], degree=3))
            Line((-10.407580534, 27.474632748), (-11.554703727, 27.47275449))
            add(Edge.make_bspline(
                [(-12.52578157, 26.81380566), (-12.525043153, 26.87185982), (-12.523660397, 26.980571842), (-12.486160478, 27.130049683), (-12.422164744, 27.254022682), (-12.319922194, 27.346461653), (-12.18239718, 27.407331144), (-12.009248925, 27.449095206), (-11.795561135, 27.471876784), (-11.639442554, 27.472445694), (-11.554703727, 27.47275449)],
                knots=[0, 0, 0, 0, 1.011827027, 1.894743824, 2.670067914, 3.415024863, 4.253666092, 5.272207079, 6.519394866, 8, 8, 8, 8], degree=3))
        make_face()
    # profile 8 of 8: a face of its own
    with BuildSketch(Plane.XY):
        with BuildLine():
            Line((-3.961100832, 26.802786056), (-3.959220736, 19.256284802))
            add(Edge.make_bspline(
                [(-3.959220736, 19.256284802), (-3.963076567, 19.209692223), (-3.970336414, 19.121966646), (-3.99829712, 18.999267855), (-4.040647434, 18.894845847), (-4.098141365, 18.809276619), (-4.169771264, 18.742396089), (-4.256941445, 18.697064656), (-4.357818409, 18.669880708), (-4.429516429, 18.668116788), (-4.467341025, 18.667186225)],
                knots=[0, 0, 0, 0, 1.271999278, 2.394949411, 3.413369715, 4.323118431, 5.181536852, 6.052778271, 6.972734865, 8, 8, 8, 8], degree=3))
            Line((-4.467341025, 18.667186225), (-5.299058361, 18.667188063))
            Line((-5.299058361, 18.667188063), (-5.299058361, 18.320910405))
            Line((-5.299058361, 18.320910405), (-2.007546951, 18.320910405))
            Line((-2.007546951, 18.320910405), (-2.007546951, 18.667188063))
            Line((-2.007546951, 18.667188063), (-2.779764671, 18.667188063))
            add(Edge.make_bspline(
                [(-2.779764671, 18.667188063), (-2.814289076, 18.66756876), (-2.882577969, 18.668321775), (-2.98272001, 18.696189217), (-3.081471838, 18.734568784), (-3.175556844, 18.793056931), (-3.261537146, 18.871583309), (-3.321123574, 18.979981863), (-3.362041558, 19.10977492), (-3.368556036, 19.205050418), (-3.372055552, 19.256231506)],
                knots=[0, 0, 0, 0, 0.877803887, 1.736286428, 2.634488349, 3.576734679, 4.550971448, 5.570120121, 6.694691728, 8, 8, 8, 8], degree=3))
            Line((-3.372055552, 19.256231506), (-3.372055552, 23.01821534))
            Line((-3.372055552, 23.01821534), (-1.158107458, 23.01821534))
            add(Edge.make_bspline(
                [(-1.158107458, 23.01821534), (-1.101278197, 23.01890193), (-0.992279831, 23.020218808), (-0.835238345, 23.011200881), (-0.692666196, 22.991485661), (-0.564583061, 22.959254425), (-0.450840709, 22.916771422), (-0.352345277, 22.86164618), (-0.266705005, 22.797458286), (-0.197457026, 22.717358039), (-0.139821155, 22.621684513), (-0.091227253, 22.506932492), (-0.050617673, 22.371886605), (-0.019210677, 22.214927487), (0.004897952, 22.037702121), (0.018947471, 21.838459716), (0.026538914, 21.618746458), (0.02541959, 21.465000599), (0.024834963, 21.384698637)],
                knots=[0, 0, 0, 0, 1.130688028, 2.168656484, 3.127251201, 3.990115579, 4.792240314, 5.535477769, 6.229605204, 6.910702075, 7.627905293, 8.444183714, 9.383981437, 10.429354697, 11.626292868, 12.94080821, 14.402174172, 16, 16, 16, 16], degree=3))
            Line((0.024834963, 21.384698637), (0.351163019, 21.385066202))
            Line((0.351163019, 21.385066202), (0.351163019, 24.971664465))
            Line((0.351163019, 24.971664465), (0.025959712, 24.971664465))
            add(Edge.make_bspline(
                [(0.025959712, 24.971664465), (0.026668858, 24.899524355), (0.028025744, 24.761490713), (0.022748432, 24.562439731), (0.009651859, 24.380359725), (-0.009516704, 24.214058374), (-0.041117367, 24.065006367), (-0.074252363, 23.931013194), (-0.120764958, 23.814878283), (-0.172638912, 23.712913215), (-0.238654631, 23.624880234), (-0.320805081, 23.550491773), (-0.420980084, 23.490269981), (-0.537050295, 23.441468987), (-0.669284856, 23.404568969), (-0.817999538, 23.378559018), (-0.982934878, 23.363301487), (-1.09864708, 23.364085001), (-1.158901399, 23.364492998)],
                knots=[0, 0, 0, 0, 1.45592283, 2.785778005, 4.017003254, 5.139764002, 6.16022002, 7.090717386, 7.920607392, 8.679475788, 9.393511104, 10.128452667, 10.901446109, 11.740937198, 12.662607922, 13.665877584, 14.784562444, 16, 16, 16, 16], degree=3))
            Line((-1.158901399, 23.364492998), (-3.372055552, 23.364492998))
            Line((-3.372055552, 23.364492998), (-3.372055552, 26.802786056))
            add(Edge.make_bspline(
                [(-3.372055552, 26.802786056), (-3.37108094, 26.850608214), (-3.369217249, 26.942055671), (-3.342096259, 27.072362656), (-3.297906448, 27.188687071), (-3.232299276, 27.288403285), (-3.149042801, 27.373383156), (-3.038566834, 27.428931727), (-2.910189042, 27.46579959), (-2.81718321, 27.470347343), (-2.767954801, 27.47275449)],
                knots=[0, 0, 0, 0, 1.11464707, 2.13147302, 3.091549386, 4.001497762, 4.902562602, 5.833024687, 6.853010125, 8, 8, 8, 8], degree=3))
            Line((-2.767954801, 27.47275449), (0.064984109, 27.474632748))
            add(Edge.make_bspline(
                [(0.064984109, 27.474632748), (0.140110651, 27.471154863), (0.286599267, 27.464373363), (0.500830616, 27.439126216), (0.702527408, 27.393967385), (0.891694128, 27.330950047), (1.070745414, 27.254665316), (1.23590935, 27.157074165), (1.392580141, 27.046877732), (1.582747366, 26.867141618), (1.806936582, 26.608752109), (2.060359664, 26.256497042), (2.297244462, 25.851767948), (2.436570812, 25.558711343), (2.508987583, 25.406391174)],
                knots=[0, 0, 0, 0, 0.792307697, 1.544914175, 2.26972427, 2.965754149, 3.643594828, 4.315869793, 4.983580278, 5.657186129, 7.066788734, 8.582010903, 10.223453531, 12, 12, 12, 12], degree=3))
            Line((2.508987583, 25.406391174), (2.848724418, 25.406391174))
            Line((2.848724418, 25.406391174), (1.990187687, 27.820910405))
            Line((1.990187687, 27.820910405), (-5.299058361, 27.820910405))
            Line((-5.299058361, 27.820910405), (-5.299058361, 27.474632748))
            Line((-5.299058361, 27.474632748), (-4.49255416, 27.474632748))
            add(Edge.make_bspline(
                [(-4.49255416, 27.474632748), (-4.446878408, 27.471341575), (-4.360538549, 27.465120344), (-4.242120001, 27.430079243), (-4.143492644, 27.372060649), (-4.071985769, 27.287646224), (-4.01839387, 27.187251308), (-3.984206611, 27.071268722), (-3.962962101, 26.941589771), (-3.961741398, 26.850556129), (-3.961100832, 26.802786056)],
                knots=[0, 0, 0, 0, 1.119687802, 2.116520953, 2.999727408, 3.881862985, 4.789741442, 5.771887262, 6.83079368, 8, 8, 8, 8], degree=3))
        make_face()
    extrude(amount=EXTRUDE_1_DEPTH)


solid = part.part
